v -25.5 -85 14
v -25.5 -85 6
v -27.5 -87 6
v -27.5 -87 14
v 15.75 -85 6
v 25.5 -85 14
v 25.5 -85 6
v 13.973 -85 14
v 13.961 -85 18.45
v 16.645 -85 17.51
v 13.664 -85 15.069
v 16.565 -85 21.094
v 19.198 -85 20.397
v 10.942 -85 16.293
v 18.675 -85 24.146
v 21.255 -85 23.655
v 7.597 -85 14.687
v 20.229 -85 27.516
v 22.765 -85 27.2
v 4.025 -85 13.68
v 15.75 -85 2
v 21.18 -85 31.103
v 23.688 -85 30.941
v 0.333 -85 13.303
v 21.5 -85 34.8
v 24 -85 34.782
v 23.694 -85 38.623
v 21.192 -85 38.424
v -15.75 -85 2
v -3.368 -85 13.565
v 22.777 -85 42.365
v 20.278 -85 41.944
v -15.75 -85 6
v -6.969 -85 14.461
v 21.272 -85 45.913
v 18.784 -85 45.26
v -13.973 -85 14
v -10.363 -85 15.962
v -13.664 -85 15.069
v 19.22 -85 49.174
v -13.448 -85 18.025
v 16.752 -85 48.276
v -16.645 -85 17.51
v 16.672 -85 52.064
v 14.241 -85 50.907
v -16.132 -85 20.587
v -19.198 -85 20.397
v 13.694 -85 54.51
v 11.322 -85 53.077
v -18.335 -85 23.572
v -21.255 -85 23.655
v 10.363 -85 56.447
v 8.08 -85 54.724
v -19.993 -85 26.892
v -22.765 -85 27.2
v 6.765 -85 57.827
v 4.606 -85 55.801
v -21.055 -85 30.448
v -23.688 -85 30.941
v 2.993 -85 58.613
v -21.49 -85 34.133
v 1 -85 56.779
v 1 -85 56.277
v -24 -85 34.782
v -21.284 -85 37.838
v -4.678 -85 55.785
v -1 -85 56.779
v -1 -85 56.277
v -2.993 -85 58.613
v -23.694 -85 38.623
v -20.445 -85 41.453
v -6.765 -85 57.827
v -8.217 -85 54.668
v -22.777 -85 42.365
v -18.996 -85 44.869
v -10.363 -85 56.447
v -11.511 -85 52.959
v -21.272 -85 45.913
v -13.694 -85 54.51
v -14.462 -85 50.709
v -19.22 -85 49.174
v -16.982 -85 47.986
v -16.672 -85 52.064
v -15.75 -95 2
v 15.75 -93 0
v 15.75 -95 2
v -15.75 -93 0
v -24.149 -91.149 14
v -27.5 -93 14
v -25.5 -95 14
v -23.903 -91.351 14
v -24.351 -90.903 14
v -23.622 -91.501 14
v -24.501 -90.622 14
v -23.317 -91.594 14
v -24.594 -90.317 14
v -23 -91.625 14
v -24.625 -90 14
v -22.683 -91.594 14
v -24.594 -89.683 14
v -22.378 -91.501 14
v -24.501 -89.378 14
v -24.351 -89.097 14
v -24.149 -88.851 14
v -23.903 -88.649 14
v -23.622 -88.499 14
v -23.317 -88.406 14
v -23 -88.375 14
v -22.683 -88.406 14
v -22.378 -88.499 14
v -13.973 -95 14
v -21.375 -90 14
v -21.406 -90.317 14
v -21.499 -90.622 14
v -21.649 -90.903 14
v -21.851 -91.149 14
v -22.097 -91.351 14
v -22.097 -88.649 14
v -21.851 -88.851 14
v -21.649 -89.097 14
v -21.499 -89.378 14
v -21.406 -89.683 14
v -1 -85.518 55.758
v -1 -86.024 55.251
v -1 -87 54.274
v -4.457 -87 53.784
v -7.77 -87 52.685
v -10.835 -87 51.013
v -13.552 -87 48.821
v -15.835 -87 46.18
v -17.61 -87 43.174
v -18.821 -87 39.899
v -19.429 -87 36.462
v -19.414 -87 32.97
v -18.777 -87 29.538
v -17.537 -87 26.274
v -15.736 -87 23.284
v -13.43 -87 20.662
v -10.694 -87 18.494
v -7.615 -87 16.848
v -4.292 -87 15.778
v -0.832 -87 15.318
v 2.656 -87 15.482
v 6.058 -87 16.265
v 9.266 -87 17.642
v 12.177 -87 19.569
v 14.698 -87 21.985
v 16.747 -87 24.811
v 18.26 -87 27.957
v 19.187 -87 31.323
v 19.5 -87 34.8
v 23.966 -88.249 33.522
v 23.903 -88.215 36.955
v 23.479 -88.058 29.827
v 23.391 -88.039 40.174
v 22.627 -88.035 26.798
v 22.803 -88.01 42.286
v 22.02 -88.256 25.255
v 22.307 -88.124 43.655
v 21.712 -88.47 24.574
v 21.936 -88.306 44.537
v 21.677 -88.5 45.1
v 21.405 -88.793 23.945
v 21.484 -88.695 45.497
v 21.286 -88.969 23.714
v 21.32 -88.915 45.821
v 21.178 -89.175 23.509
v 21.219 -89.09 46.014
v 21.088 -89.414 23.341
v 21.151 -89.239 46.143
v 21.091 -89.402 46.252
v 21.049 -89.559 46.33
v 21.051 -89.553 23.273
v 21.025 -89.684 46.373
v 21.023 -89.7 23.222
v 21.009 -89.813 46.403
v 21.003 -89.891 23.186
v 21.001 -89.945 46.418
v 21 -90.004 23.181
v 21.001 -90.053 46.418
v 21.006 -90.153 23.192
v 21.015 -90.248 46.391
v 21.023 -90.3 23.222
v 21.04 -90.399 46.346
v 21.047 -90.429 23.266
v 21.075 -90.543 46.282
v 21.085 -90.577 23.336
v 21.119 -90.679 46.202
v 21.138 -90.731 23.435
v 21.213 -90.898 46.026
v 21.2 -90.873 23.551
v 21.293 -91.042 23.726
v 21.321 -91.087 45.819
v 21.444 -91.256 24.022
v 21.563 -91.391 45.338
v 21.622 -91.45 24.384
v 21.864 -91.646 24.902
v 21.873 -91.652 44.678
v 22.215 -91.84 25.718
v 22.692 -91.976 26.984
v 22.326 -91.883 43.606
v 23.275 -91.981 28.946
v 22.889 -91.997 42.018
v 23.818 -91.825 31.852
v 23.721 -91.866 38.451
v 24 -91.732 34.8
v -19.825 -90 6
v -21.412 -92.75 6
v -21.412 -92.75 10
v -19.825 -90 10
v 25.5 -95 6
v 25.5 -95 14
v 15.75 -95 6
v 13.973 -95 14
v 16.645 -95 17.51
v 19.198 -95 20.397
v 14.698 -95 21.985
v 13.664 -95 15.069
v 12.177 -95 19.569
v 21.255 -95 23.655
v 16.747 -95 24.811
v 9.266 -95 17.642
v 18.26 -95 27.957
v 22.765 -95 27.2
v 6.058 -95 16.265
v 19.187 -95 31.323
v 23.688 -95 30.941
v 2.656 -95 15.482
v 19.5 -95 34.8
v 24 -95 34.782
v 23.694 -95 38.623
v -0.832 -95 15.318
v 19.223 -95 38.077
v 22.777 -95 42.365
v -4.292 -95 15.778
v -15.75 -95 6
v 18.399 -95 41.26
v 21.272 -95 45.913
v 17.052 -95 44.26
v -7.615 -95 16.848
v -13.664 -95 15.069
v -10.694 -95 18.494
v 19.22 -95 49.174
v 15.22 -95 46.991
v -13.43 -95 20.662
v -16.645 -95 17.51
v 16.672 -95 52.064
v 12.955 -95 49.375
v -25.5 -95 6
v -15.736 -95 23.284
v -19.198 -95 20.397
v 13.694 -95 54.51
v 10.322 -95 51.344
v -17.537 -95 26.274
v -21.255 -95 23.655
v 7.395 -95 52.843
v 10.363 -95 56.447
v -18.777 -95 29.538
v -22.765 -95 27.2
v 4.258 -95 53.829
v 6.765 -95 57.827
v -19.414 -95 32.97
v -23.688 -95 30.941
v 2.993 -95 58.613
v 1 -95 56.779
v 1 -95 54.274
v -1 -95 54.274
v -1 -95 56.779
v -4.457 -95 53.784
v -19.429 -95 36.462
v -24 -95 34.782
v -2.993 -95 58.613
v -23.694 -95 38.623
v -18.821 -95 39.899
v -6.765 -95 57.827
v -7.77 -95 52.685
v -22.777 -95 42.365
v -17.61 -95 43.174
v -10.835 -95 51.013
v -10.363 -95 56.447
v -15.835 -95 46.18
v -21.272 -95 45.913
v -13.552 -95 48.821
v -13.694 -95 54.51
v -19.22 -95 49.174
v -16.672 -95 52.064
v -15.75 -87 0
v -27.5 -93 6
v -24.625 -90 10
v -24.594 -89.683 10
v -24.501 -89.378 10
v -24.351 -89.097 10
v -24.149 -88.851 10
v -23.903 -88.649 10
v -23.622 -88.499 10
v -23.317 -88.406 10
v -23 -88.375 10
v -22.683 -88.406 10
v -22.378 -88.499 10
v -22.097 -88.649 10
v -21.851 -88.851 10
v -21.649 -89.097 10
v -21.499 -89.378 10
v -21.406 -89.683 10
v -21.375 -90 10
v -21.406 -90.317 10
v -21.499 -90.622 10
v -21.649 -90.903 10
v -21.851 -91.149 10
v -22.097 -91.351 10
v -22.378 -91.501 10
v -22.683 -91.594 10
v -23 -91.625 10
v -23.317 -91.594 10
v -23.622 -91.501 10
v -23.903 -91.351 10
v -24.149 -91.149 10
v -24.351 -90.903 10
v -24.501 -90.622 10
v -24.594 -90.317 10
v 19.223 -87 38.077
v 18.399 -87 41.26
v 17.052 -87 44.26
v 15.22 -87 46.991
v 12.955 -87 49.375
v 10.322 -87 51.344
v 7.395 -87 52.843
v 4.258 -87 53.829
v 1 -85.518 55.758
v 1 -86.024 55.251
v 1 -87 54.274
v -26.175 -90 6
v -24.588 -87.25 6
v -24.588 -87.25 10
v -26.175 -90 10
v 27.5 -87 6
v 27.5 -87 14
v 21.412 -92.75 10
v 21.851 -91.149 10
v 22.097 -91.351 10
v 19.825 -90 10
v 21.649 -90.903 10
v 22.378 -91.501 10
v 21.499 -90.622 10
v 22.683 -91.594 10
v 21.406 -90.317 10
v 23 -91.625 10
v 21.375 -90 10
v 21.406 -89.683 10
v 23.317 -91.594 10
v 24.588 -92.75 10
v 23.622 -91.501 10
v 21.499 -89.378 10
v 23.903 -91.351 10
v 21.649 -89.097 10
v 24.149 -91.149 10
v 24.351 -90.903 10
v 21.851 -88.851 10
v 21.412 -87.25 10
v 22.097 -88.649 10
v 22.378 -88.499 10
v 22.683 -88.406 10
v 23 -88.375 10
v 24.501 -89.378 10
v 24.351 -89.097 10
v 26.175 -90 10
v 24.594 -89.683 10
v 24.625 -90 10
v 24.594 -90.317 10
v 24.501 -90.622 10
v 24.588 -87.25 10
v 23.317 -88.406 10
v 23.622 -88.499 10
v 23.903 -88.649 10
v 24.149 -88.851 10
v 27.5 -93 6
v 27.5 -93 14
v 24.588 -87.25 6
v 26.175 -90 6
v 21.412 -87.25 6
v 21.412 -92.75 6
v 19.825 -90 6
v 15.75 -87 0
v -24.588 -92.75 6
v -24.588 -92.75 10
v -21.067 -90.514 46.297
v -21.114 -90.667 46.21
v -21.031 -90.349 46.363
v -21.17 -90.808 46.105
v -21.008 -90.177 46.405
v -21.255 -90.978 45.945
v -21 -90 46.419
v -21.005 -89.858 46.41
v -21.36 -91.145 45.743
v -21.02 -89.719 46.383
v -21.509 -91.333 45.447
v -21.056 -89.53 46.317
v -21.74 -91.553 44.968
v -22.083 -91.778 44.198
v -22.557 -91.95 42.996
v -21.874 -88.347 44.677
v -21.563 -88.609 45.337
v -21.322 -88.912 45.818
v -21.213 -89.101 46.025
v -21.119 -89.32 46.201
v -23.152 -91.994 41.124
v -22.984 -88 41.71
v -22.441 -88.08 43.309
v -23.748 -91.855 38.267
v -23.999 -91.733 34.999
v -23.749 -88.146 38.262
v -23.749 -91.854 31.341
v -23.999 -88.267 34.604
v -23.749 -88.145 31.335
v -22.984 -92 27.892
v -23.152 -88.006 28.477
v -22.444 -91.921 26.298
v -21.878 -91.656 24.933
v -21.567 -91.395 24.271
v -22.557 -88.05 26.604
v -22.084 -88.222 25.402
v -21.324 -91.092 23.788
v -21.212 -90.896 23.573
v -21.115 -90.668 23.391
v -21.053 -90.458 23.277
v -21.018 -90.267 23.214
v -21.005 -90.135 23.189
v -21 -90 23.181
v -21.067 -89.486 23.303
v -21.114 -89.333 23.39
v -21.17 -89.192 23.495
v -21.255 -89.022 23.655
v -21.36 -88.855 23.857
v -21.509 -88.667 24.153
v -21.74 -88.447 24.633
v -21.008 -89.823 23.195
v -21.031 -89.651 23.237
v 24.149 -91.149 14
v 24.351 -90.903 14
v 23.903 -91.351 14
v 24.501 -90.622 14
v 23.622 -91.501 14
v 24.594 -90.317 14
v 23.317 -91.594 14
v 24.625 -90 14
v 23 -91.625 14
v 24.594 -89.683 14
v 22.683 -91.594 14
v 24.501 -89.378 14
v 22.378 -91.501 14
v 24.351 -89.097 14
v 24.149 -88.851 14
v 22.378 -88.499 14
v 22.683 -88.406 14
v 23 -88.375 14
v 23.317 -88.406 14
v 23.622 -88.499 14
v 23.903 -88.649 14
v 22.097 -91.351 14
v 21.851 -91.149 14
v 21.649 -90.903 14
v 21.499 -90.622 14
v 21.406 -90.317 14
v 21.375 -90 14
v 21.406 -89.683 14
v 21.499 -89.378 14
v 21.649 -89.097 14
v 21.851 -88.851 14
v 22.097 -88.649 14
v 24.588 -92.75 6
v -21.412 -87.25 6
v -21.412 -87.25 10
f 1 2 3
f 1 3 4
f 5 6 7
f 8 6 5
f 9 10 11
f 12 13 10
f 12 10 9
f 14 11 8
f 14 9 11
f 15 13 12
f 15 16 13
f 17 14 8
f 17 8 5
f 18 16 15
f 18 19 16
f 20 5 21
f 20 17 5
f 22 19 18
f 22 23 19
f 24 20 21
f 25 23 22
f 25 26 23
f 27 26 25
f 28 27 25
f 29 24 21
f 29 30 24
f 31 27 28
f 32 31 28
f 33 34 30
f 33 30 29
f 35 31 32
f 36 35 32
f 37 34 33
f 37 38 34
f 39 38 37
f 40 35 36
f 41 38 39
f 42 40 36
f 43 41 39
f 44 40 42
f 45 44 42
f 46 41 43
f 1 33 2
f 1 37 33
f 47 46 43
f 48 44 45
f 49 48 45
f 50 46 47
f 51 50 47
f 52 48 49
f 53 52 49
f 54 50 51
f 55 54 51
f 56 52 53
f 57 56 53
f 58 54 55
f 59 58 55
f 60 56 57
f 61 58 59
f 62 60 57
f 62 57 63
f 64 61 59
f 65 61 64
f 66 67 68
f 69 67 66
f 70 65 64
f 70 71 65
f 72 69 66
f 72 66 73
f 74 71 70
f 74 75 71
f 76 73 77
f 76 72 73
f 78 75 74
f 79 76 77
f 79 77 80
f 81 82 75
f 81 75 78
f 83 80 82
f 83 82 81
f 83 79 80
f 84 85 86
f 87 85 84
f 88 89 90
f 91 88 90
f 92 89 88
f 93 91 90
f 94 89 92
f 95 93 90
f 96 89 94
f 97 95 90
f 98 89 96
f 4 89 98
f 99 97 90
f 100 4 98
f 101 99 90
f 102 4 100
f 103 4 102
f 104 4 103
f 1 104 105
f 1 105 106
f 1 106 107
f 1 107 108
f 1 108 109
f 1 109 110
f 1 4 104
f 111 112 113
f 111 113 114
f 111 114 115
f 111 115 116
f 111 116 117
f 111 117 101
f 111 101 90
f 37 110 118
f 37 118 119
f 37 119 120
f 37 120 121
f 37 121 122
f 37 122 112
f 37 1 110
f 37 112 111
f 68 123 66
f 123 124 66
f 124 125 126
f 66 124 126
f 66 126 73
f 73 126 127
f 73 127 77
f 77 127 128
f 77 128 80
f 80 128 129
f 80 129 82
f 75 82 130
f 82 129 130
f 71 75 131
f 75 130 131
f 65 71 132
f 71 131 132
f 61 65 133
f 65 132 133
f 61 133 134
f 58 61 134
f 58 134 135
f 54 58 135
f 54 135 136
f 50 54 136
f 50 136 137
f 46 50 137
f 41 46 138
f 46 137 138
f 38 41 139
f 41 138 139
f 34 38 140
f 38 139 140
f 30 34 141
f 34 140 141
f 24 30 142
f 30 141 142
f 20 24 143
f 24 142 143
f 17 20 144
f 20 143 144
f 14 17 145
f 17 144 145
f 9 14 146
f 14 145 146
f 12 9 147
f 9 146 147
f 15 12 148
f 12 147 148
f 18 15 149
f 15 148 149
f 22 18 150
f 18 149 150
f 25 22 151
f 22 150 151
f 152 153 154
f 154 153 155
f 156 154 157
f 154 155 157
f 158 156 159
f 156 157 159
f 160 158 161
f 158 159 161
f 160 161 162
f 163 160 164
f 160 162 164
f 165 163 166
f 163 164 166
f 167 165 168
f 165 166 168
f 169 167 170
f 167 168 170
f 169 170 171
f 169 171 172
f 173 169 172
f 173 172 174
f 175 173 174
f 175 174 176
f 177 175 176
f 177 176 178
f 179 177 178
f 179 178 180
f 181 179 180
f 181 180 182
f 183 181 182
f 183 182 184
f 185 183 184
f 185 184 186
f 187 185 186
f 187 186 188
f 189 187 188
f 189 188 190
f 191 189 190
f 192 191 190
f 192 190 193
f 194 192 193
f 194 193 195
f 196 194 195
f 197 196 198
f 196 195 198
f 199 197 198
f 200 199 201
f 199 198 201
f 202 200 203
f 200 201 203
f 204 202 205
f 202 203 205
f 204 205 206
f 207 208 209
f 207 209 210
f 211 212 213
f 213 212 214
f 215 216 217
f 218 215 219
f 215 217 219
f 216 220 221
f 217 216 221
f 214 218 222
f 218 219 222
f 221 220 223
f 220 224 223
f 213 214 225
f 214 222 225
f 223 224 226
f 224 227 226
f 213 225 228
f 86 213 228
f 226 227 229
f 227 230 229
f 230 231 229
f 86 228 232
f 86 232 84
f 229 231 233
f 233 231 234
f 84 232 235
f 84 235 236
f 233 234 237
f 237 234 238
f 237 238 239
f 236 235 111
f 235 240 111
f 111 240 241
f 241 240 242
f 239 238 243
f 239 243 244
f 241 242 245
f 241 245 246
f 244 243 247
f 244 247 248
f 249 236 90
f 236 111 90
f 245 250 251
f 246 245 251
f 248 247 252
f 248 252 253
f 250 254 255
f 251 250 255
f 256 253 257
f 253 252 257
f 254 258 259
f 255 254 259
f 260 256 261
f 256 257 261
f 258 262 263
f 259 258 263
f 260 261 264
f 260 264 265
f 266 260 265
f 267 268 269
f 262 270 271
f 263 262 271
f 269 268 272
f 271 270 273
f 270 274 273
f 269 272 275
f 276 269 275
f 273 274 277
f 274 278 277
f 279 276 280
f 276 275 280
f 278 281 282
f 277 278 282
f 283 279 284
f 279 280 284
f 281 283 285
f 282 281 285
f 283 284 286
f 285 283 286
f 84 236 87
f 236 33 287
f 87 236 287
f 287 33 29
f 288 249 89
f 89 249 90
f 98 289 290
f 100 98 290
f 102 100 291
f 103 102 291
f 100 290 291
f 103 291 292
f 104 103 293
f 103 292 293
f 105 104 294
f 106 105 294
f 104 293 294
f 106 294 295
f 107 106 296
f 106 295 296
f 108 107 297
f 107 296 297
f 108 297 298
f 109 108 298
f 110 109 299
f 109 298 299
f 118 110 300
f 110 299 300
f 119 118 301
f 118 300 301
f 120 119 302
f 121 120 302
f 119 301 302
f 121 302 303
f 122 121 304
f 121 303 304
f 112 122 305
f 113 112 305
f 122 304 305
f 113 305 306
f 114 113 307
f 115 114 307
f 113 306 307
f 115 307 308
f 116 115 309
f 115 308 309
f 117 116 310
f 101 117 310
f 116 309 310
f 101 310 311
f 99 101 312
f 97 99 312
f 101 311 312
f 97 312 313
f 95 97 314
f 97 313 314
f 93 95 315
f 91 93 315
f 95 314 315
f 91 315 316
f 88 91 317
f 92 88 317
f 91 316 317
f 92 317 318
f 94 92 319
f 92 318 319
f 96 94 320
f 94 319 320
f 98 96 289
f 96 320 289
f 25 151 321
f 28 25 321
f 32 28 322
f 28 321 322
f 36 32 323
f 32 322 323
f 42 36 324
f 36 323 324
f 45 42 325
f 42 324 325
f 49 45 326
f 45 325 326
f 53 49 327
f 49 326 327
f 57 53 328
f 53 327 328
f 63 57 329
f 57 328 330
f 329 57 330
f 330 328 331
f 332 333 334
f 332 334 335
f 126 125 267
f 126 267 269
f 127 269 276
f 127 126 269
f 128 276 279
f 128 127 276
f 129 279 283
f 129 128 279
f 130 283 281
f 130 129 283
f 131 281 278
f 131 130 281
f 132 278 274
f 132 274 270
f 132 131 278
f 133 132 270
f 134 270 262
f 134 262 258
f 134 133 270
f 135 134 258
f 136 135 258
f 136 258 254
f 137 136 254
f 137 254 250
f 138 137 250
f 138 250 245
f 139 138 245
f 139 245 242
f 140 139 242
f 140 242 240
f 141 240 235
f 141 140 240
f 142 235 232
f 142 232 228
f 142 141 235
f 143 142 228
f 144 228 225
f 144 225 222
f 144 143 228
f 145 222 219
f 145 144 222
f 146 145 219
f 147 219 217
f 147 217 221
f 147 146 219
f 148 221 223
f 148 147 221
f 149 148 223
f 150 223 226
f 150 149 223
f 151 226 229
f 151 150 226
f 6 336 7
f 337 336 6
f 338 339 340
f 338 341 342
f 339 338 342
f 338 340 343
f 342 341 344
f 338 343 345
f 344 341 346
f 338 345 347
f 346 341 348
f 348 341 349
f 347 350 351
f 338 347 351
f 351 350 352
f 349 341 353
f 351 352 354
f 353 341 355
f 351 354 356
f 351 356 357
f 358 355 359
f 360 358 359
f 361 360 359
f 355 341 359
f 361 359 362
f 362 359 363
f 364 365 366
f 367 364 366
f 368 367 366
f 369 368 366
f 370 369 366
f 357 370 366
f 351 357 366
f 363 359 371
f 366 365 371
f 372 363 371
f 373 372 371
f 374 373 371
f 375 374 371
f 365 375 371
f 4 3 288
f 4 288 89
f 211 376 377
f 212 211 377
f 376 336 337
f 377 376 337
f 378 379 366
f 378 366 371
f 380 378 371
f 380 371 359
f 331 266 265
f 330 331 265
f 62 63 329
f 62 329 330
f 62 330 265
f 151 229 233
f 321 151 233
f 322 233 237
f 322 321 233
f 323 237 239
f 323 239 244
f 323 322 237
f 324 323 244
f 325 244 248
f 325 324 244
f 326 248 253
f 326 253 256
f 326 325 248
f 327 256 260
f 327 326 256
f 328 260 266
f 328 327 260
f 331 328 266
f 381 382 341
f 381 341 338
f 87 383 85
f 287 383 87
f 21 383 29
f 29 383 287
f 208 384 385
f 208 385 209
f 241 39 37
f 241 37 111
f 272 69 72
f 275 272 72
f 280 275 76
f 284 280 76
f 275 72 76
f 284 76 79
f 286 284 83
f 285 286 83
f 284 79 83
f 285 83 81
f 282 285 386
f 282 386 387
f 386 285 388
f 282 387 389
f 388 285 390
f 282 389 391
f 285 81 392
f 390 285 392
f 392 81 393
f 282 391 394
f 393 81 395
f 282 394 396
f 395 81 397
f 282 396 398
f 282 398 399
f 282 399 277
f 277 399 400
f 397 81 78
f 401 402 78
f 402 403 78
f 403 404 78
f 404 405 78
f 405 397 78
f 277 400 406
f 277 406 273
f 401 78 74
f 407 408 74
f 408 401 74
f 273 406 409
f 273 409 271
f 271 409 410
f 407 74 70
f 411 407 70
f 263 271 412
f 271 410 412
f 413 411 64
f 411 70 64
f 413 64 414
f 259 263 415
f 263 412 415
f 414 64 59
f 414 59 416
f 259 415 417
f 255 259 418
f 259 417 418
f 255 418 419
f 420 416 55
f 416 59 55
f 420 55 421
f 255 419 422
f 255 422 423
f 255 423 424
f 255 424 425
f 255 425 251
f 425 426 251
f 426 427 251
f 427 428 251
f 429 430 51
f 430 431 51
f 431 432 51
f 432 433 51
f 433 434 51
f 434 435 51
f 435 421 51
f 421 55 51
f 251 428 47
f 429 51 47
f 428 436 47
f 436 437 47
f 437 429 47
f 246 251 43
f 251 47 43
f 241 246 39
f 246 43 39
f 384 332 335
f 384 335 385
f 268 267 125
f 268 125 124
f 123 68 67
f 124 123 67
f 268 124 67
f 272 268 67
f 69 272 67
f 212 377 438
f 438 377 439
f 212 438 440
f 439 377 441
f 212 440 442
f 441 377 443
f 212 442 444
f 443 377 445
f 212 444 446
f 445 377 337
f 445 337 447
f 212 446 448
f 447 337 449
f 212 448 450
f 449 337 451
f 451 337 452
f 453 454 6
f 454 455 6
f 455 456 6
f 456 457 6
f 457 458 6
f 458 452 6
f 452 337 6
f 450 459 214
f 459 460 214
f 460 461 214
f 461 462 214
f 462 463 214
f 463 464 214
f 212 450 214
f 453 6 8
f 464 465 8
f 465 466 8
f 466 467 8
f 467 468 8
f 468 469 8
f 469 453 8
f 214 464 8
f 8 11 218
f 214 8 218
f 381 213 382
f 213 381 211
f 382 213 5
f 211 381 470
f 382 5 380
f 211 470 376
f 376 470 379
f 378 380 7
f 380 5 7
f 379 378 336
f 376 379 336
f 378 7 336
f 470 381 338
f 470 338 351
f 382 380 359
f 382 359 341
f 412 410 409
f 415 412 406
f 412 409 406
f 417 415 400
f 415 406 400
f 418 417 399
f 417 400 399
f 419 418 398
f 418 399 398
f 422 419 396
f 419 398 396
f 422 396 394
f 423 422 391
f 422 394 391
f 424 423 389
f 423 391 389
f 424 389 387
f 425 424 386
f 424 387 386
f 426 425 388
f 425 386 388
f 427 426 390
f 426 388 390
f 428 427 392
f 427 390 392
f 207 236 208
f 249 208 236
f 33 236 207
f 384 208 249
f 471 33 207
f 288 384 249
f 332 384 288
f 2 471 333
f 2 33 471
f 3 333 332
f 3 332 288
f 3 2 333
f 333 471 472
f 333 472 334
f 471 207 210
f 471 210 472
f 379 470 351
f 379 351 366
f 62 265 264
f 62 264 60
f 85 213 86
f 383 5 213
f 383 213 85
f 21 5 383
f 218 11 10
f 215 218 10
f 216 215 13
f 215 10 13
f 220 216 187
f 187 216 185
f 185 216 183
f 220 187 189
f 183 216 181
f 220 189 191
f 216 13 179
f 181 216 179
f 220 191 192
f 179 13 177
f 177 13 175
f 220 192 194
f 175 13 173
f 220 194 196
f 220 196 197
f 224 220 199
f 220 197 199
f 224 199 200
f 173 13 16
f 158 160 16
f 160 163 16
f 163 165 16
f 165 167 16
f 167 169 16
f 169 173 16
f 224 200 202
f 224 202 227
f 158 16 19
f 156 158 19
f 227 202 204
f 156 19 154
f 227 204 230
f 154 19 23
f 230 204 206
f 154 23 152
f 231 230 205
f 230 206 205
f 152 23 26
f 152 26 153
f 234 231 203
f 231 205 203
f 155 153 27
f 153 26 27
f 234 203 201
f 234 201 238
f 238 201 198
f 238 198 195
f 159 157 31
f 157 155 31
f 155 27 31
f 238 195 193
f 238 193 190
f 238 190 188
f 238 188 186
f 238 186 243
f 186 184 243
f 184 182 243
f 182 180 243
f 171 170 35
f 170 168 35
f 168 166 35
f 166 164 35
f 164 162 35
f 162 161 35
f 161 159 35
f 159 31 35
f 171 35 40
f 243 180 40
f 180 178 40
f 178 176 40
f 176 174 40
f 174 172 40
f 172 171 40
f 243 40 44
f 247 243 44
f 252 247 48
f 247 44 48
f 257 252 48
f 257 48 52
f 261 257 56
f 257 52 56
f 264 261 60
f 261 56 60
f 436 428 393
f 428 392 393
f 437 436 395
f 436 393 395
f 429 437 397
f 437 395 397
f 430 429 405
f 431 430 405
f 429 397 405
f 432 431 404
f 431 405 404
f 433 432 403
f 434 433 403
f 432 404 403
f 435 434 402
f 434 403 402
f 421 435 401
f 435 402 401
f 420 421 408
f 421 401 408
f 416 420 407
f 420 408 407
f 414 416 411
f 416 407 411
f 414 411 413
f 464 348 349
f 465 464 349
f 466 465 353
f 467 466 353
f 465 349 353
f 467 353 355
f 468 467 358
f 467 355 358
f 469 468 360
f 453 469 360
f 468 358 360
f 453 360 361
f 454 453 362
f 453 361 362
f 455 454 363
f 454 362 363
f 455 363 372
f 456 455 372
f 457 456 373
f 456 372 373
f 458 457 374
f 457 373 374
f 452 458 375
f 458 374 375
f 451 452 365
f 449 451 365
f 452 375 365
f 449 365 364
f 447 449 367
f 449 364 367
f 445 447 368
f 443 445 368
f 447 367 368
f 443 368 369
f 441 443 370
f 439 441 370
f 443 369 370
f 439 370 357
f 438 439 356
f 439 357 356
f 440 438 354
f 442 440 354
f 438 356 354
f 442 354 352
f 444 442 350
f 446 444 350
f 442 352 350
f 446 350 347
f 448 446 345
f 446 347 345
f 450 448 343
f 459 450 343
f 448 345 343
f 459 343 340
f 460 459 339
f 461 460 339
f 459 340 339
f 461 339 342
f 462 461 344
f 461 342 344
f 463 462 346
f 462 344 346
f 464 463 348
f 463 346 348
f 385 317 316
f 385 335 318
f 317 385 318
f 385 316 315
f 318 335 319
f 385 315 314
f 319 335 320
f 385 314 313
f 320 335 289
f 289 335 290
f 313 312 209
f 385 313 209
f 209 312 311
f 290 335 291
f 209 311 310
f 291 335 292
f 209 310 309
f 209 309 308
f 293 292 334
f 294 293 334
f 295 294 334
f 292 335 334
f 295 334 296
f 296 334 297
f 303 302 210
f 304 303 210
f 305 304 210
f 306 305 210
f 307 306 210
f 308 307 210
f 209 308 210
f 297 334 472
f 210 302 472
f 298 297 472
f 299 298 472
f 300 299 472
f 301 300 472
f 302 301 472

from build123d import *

# Parameters (mm, degrees)
SKETCH027_R         = 19.5
PAD014_DEPTH        = 10
HOLE004_D           = 3.25
HOLE004_DEPTH       = 55
HOLE004_CBORE_D     = 4
HOLE004_CBORE_DEPTH = 30
POCKET003_DEPTH     = 4
SKETCH033_W         = 2
SKETCH033_H         = 10
POCKET004_DEPTH     = 12
CHAMFER005_SIZE     = 2


with BuildPart() as part:
    # Sketch027 → Pad014 (new body)
    with BuildSketch(Plane.XZ.offset(85)):
        with BuildLine():
            Line((-27.5, 6), (-27.5, 13.999999))
            Line((-27.5, 13.999999), (-11.973302, 13.999999))
            ThreePointArc((11.973302, 13.999999), (0, 58.8), (-11.973302, 13.999999))
            Line((27.5, 13.999999), (11.973302, 13.999999))
            Line((27.5, 6), (27.5, 13.999999))
            Line((15.75, 6), (27.5, 6))
            Line((15.75, 6), (15.75, 0))
            Line((15.75, 0), (-15.75, 0))
            Line((-15.75, 6), (-15.75, 0))
            Line((-15.75, 6), (-27.5, 6))
        make_face()
        with Locations((0, 34.8)):
            Circle(SKETCH027_R, mode=Mode.SUBTRACT)
    extrude(amount=PAD014_DEPTH)

    # Hole004
    with Locations(Plane.XY.offset(50)):
        with Locations((-23, -90), (23, -90)):
            CounterBoreHole(HOLE004_D / 2, HOLE004_CBORE_D / 2, HOLE004_CBORE_DEPTH, depth=HOLE004_DEPTH)

    # Sketch029 → Pocket003 (cut)
    with BuildSketch(Plane.XY.offset(6)):
        Polygon((-21.412287, -92.75), (-19.824574, -90), (-21.412287, -87.25), (-24.587713, -87.25), (-26.175426, -90), (-24.587713, -92.75), align=None)
        Polygon((24.587713, -92.75), (26.175426, -90), (24.587713, -87.25), (21.412287, -87.25), (19.824574, -90), (21.412287, -92.75), align=None)
    extrude(amount=POCKET003_DEPTH, mode=Mode.SUBTRACT)

    # Sketch033 → Pocket004 (cut)
    with BuildSketch(Plane.XZ.offset(84)):
        with Locations((0, 57)):
            Rectangle(SKETCH033_W, SKETCH033_H)
    extrude(amount=POCKET004_DEPTH, mode=Mode.SUBTRACT)

    # Chamfer005
    chamfer005_edges = [part.edges().sort_by_distance(p)[0] for p in [
        (27.5, -85, 10),
        (-27.5, -85, 10),
        (0, -85, 0),
        (14.137716, -85, 48.230376),
        (-13.430376, -85, 20.662284),
        (11.973302, -90, 13.999999),
        (-11.973302, -90, 13.999999),
        (27.5, -95, 10),
        (-27.5, -95, 10),
        (0, -95, 0),
        (-1, -90, 58.779158),
        (1, -90, 58.779158),
    ]]
    chamfer(chamfer005_edges, length=CHAMFER005_SIZE)


solid = part.part
